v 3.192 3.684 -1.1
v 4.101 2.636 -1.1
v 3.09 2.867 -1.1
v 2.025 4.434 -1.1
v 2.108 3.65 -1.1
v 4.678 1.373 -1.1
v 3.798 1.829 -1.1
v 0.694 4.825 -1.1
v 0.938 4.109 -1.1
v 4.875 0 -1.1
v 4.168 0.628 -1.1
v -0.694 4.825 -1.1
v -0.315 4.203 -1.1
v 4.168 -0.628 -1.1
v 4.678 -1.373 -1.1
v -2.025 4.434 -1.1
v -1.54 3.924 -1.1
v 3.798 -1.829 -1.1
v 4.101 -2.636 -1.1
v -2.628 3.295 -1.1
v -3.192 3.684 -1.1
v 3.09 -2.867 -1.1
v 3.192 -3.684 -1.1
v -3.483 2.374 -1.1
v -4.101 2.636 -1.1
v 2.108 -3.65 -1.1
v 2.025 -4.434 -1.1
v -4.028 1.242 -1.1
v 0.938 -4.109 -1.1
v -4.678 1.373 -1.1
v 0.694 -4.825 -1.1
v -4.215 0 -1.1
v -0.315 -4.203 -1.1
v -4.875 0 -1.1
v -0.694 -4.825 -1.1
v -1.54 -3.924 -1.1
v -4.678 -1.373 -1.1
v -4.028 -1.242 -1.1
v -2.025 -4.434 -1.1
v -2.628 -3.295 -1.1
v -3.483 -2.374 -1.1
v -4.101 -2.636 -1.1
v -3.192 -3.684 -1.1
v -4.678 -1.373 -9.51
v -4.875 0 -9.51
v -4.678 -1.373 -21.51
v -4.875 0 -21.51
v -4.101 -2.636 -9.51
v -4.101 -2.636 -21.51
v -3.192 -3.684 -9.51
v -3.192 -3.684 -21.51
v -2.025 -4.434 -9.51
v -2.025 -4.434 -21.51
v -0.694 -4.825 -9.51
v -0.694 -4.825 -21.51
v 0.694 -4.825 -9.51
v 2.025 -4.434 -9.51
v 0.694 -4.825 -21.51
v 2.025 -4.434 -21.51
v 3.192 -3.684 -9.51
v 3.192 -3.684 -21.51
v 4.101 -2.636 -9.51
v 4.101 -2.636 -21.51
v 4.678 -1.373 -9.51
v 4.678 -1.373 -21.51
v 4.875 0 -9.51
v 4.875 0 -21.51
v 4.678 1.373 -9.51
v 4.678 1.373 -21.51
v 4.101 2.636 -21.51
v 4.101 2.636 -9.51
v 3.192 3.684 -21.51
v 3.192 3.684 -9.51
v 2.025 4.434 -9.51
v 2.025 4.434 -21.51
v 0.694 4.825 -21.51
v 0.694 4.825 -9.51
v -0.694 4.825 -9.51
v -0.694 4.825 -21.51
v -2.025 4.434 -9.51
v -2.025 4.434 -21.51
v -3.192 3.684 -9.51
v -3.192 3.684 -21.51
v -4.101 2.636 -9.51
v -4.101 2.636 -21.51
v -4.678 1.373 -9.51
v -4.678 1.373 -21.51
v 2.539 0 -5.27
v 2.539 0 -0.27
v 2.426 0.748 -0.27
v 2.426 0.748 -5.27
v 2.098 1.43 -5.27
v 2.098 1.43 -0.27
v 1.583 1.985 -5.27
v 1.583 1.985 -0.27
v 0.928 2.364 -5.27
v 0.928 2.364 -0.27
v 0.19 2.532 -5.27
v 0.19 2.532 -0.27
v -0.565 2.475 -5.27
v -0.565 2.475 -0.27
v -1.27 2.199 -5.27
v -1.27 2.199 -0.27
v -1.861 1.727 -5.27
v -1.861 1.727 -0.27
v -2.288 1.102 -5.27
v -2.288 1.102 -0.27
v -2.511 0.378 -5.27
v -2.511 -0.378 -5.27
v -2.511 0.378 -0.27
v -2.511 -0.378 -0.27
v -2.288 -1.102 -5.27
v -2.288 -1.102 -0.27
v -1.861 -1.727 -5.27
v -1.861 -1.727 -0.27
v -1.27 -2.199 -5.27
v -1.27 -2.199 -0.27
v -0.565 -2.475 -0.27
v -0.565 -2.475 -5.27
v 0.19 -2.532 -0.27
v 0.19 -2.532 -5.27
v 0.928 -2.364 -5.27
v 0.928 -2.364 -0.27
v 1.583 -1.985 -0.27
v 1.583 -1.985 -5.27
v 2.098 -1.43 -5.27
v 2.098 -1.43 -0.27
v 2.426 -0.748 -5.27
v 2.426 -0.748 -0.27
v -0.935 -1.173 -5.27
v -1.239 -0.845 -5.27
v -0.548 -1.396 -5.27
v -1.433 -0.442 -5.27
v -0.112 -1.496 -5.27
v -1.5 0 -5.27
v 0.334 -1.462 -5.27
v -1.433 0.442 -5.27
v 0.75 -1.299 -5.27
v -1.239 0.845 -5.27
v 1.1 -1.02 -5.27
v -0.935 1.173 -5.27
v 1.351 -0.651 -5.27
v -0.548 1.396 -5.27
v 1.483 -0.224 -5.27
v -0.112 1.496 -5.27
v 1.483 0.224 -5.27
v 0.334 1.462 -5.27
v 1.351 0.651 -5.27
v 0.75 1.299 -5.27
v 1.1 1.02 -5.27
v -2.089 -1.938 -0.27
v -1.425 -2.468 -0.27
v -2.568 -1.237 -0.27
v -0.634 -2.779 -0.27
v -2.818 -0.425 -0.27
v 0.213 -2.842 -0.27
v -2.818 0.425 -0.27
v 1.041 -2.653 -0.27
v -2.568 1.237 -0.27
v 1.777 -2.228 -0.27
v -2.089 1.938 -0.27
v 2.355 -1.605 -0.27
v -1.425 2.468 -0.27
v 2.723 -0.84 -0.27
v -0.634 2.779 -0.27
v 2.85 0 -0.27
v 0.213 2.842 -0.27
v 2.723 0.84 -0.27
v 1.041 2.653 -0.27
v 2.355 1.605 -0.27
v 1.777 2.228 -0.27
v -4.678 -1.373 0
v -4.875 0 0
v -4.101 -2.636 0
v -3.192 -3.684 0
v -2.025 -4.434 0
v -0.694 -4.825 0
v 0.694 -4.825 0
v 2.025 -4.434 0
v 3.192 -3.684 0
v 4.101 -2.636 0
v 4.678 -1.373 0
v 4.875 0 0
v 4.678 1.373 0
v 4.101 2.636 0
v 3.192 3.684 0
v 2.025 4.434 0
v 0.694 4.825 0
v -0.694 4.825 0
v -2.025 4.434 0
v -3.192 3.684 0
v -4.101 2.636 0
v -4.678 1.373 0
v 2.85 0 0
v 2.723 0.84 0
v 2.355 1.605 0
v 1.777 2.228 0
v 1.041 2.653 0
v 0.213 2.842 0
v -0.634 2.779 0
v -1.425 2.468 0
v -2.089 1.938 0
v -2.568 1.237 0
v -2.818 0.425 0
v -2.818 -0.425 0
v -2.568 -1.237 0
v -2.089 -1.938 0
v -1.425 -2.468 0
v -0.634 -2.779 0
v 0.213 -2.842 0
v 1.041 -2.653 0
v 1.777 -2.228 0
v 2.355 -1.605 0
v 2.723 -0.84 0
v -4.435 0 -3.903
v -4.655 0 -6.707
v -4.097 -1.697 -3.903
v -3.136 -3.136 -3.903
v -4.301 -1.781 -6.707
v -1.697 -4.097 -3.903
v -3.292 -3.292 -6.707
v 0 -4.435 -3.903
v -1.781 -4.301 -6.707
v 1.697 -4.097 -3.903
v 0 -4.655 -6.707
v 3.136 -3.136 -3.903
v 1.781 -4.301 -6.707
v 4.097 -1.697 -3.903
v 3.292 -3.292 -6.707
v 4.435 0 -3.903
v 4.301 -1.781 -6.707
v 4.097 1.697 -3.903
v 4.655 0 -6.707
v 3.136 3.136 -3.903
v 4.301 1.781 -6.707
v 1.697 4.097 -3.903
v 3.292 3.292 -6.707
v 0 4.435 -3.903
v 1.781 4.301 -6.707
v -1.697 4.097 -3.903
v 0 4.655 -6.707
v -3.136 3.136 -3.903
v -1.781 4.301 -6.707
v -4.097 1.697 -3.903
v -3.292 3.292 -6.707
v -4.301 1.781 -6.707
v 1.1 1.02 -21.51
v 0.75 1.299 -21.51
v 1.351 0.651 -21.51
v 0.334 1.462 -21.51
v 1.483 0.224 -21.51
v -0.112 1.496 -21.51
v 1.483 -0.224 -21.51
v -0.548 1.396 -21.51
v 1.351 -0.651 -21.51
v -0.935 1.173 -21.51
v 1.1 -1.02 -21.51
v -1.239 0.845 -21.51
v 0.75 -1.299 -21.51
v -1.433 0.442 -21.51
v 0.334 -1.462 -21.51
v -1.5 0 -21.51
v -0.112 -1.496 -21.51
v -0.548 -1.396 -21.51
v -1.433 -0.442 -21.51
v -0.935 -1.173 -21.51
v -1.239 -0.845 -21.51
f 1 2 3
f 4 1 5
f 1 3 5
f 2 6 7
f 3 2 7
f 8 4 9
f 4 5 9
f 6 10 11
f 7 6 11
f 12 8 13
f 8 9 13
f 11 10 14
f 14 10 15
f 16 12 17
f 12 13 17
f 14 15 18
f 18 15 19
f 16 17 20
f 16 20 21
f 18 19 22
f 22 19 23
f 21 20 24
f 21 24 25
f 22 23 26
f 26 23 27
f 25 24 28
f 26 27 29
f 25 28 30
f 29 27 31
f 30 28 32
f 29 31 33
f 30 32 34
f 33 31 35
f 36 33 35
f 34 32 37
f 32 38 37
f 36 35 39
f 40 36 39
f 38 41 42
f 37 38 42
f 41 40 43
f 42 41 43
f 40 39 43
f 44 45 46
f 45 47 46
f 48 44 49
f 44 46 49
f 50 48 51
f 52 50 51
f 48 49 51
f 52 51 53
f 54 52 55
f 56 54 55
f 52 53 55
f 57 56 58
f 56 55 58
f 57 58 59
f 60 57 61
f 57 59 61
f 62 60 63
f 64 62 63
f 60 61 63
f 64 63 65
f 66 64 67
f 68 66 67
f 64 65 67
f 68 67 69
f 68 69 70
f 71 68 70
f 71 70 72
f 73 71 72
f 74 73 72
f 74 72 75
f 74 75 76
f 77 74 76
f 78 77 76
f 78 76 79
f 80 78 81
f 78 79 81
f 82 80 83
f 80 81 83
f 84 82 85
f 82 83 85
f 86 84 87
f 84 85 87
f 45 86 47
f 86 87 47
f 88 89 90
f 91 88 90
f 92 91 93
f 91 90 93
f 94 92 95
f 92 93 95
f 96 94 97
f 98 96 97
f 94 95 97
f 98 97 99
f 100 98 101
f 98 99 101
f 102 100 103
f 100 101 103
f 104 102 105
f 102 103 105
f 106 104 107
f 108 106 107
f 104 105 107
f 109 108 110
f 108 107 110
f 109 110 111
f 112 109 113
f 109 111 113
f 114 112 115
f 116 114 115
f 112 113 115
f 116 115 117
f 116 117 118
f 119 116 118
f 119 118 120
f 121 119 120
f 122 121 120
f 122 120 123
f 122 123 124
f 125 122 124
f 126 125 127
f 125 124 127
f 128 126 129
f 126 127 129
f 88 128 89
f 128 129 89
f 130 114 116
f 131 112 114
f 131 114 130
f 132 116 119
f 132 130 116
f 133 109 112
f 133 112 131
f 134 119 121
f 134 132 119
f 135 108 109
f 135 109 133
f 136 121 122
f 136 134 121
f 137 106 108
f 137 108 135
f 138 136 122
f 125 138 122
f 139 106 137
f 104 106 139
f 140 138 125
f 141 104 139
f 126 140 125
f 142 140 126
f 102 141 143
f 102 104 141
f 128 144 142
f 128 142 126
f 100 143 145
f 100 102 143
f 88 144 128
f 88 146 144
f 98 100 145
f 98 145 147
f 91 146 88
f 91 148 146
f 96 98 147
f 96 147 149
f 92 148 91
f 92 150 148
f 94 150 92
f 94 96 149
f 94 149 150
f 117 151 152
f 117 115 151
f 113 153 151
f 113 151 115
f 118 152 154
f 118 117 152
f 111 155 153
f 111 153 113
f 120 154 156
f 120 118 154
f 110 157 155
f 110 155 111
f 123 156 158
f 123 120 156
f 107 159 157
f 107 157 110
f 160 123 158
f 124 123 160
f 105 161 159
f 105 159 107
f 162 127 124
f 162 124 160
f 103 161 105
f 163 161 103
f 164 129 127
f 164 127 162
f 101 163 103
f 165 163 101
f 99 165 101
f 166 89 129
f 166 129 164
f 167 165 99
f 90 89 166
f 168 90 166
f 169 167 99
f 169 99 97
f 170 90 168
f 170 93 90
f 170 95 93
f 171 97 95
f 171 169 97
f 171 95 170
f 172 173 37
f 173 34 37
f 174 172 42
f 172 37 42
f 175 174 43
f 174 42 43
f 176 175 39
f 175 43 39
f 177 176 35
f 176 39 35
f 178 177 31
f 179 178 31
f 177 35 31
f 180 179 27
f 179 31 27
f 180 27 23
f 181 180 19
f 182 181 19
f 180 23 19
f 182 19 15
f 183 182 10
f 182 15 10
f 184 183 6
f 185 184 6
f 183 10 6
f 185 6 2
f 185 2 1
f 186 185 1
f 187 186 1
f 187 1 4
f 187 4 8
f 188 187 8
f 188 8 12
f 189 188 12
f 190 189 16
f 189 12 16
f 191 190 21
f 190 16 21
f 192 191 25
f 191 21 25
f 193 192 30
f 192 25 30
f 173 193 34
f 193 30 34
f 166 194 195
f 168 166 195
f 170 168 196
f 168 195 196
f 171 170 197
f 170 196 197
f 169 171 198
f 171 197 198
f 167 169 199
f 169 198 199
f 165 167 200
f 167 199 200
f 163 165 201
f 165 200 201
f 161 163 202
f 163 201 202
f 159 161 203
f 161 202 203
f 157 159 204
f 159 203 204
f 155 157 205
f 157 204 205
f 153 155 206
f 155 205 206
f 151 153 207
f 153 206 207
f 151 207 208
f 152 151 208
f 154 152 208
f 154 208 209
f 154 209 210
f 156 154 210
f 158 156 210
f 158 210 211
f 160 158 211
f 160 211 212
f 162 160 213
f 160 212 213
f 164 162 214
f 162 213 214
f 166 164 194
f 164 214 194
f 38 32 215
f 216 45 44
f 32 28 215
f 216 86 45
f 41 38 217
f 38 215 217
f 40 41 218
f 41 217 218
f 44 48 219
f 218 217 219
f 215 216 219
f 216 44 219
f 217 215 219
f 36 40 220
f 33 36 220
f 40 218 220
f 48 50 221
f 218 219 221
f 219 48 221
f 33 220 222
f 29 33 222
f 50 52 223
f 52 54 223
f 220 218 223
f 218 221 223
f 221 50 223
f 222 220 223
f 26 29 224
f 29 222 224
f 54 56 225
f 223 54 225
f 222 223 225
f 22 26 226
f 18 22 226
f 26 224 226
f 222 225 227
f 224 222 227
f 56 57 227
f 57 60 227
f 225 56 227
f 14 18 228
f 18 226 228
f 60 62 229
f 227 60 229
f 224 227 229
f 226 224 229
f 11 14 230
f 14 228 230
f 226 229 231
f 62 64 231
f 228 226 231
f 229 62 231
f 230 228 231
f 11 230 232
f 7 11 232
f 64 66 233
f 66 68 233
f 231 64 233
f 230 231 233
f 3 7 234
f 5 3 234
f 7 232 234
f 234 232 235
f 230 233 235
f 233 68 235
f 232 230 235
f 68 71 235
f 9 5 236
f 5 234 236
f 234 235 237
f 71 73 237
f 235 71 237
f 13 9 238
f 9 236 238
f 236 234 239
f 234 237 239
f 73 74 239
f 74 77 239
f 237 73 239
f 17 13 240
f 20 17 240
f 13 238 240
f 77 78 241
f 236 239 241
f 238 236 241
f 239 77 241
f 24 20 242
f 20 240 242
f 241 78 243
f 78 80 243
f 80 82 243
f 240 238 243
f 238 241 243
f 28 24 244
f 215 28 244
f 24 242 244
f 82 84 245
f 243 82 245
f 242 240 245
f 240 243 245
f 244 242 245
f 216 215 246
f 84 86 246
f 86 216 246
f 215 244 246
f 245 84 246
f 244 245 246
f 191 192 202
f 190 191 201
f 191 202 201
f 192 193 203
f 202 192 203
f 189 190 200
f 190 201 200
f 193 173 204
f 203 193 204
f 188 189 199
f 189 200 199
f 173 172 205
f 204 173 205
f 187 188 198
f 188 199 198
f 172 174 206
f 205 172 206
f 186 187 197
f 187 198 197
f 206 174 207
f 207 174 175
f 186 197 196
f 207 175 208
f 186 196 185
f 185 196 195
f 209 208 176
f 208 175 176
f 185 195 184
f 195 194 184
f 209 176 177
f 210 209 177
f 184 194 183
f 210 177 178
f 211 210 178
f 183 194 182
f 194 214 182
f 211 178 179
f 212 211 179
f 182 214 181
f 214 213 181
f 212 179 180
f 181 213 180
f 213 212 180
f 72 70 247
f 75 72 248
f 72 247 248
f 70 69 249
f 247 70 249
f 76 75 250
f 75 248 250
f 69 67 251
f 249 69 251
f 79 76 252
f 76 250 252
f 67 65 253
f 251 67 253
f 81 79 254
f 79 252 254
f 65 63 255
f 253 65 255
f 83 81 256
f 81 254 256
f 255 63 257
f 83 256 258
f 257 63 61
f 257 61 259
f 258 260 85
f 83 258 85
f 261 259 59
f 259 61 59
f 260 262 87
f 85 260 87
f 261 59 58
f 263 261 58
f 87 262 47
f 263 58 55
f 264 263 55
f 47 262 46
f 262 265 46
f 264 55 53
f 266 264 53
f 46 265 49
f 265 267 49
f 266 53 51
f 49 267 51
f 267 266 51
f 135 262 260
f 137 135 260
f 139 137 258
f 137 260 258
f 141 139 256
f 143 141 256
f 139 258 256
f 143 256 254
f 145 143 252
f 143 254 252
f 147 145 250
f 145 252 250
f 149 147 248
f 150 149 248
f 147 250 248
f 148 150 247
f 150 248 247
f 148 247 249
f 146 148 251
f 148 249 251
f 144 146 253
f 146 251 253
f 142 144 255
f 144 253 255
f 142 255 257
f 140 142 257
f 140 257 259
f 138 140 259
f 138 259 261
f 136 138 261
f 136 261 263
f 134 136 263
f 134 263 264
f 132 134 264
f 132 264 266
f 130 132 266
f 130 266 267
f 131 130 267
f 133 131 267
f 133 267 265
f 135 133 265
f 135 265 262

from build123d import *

# Parameters (mm, degrees)
SKETCH2_R          = 2.85
CUT_EXTRUDE1_DEPTH = 0.27
SKETCH3_R          = 2.539141962
CUT_EXTRUDE2_DEPTH = 5
SKETCH4_R          = 1.5
CUT_EXTRUDE3_DEPTH = 19


with BuildPart() as part:
    # Sketch1 → Revolve1 (revolve)
    with BuildSketch(Plane(origin=(0, 0, 0), x_dir=(1, 0, 0), z_dir=(0, 1, 0))):
        Polygon((0, 0), (-4.875, 0), (-4.875, 1.1), (-4.215, 1.1), (-4.875, 9.51), (-4.875, 21.51), (0, 21.51), align=None)
    revolve(axis=Axis((0, 0, -21.51), (0, 0, 1)))

    # Sketch2 → Cut-Extrude1 (cut)
    with BuildSketch(Plane.XY):
        Circle(SKETCH2_R)
    extrude(amount=-CUT_EXTRUDE1_DEPTH, mode=Mode.SUBTRACT)

    # Sketch3 → Cut-Extrude2 (cut)
    with BuildSketch(Plane.XY.offset(-0.27)):
        Circle(SKETCH3_R)
    extrude(amount=-CUT_EXTRUDE2_DEPTH, mode=Mode.SUBTRACT)

    # Sketch4 → Cut-Extrude3 (cut)
    with BuildSketch(Plane(origin=(0, 0, -21.51), x_dir=(-1, 0, 0), z_dir=(0, 0, -1))):
        Circle(SKETCH4_R)
    extrude(amount=-CUT_EXTRUDE3_DEPTH, mode=Mode.SUBTRACT)


solid = part.part
